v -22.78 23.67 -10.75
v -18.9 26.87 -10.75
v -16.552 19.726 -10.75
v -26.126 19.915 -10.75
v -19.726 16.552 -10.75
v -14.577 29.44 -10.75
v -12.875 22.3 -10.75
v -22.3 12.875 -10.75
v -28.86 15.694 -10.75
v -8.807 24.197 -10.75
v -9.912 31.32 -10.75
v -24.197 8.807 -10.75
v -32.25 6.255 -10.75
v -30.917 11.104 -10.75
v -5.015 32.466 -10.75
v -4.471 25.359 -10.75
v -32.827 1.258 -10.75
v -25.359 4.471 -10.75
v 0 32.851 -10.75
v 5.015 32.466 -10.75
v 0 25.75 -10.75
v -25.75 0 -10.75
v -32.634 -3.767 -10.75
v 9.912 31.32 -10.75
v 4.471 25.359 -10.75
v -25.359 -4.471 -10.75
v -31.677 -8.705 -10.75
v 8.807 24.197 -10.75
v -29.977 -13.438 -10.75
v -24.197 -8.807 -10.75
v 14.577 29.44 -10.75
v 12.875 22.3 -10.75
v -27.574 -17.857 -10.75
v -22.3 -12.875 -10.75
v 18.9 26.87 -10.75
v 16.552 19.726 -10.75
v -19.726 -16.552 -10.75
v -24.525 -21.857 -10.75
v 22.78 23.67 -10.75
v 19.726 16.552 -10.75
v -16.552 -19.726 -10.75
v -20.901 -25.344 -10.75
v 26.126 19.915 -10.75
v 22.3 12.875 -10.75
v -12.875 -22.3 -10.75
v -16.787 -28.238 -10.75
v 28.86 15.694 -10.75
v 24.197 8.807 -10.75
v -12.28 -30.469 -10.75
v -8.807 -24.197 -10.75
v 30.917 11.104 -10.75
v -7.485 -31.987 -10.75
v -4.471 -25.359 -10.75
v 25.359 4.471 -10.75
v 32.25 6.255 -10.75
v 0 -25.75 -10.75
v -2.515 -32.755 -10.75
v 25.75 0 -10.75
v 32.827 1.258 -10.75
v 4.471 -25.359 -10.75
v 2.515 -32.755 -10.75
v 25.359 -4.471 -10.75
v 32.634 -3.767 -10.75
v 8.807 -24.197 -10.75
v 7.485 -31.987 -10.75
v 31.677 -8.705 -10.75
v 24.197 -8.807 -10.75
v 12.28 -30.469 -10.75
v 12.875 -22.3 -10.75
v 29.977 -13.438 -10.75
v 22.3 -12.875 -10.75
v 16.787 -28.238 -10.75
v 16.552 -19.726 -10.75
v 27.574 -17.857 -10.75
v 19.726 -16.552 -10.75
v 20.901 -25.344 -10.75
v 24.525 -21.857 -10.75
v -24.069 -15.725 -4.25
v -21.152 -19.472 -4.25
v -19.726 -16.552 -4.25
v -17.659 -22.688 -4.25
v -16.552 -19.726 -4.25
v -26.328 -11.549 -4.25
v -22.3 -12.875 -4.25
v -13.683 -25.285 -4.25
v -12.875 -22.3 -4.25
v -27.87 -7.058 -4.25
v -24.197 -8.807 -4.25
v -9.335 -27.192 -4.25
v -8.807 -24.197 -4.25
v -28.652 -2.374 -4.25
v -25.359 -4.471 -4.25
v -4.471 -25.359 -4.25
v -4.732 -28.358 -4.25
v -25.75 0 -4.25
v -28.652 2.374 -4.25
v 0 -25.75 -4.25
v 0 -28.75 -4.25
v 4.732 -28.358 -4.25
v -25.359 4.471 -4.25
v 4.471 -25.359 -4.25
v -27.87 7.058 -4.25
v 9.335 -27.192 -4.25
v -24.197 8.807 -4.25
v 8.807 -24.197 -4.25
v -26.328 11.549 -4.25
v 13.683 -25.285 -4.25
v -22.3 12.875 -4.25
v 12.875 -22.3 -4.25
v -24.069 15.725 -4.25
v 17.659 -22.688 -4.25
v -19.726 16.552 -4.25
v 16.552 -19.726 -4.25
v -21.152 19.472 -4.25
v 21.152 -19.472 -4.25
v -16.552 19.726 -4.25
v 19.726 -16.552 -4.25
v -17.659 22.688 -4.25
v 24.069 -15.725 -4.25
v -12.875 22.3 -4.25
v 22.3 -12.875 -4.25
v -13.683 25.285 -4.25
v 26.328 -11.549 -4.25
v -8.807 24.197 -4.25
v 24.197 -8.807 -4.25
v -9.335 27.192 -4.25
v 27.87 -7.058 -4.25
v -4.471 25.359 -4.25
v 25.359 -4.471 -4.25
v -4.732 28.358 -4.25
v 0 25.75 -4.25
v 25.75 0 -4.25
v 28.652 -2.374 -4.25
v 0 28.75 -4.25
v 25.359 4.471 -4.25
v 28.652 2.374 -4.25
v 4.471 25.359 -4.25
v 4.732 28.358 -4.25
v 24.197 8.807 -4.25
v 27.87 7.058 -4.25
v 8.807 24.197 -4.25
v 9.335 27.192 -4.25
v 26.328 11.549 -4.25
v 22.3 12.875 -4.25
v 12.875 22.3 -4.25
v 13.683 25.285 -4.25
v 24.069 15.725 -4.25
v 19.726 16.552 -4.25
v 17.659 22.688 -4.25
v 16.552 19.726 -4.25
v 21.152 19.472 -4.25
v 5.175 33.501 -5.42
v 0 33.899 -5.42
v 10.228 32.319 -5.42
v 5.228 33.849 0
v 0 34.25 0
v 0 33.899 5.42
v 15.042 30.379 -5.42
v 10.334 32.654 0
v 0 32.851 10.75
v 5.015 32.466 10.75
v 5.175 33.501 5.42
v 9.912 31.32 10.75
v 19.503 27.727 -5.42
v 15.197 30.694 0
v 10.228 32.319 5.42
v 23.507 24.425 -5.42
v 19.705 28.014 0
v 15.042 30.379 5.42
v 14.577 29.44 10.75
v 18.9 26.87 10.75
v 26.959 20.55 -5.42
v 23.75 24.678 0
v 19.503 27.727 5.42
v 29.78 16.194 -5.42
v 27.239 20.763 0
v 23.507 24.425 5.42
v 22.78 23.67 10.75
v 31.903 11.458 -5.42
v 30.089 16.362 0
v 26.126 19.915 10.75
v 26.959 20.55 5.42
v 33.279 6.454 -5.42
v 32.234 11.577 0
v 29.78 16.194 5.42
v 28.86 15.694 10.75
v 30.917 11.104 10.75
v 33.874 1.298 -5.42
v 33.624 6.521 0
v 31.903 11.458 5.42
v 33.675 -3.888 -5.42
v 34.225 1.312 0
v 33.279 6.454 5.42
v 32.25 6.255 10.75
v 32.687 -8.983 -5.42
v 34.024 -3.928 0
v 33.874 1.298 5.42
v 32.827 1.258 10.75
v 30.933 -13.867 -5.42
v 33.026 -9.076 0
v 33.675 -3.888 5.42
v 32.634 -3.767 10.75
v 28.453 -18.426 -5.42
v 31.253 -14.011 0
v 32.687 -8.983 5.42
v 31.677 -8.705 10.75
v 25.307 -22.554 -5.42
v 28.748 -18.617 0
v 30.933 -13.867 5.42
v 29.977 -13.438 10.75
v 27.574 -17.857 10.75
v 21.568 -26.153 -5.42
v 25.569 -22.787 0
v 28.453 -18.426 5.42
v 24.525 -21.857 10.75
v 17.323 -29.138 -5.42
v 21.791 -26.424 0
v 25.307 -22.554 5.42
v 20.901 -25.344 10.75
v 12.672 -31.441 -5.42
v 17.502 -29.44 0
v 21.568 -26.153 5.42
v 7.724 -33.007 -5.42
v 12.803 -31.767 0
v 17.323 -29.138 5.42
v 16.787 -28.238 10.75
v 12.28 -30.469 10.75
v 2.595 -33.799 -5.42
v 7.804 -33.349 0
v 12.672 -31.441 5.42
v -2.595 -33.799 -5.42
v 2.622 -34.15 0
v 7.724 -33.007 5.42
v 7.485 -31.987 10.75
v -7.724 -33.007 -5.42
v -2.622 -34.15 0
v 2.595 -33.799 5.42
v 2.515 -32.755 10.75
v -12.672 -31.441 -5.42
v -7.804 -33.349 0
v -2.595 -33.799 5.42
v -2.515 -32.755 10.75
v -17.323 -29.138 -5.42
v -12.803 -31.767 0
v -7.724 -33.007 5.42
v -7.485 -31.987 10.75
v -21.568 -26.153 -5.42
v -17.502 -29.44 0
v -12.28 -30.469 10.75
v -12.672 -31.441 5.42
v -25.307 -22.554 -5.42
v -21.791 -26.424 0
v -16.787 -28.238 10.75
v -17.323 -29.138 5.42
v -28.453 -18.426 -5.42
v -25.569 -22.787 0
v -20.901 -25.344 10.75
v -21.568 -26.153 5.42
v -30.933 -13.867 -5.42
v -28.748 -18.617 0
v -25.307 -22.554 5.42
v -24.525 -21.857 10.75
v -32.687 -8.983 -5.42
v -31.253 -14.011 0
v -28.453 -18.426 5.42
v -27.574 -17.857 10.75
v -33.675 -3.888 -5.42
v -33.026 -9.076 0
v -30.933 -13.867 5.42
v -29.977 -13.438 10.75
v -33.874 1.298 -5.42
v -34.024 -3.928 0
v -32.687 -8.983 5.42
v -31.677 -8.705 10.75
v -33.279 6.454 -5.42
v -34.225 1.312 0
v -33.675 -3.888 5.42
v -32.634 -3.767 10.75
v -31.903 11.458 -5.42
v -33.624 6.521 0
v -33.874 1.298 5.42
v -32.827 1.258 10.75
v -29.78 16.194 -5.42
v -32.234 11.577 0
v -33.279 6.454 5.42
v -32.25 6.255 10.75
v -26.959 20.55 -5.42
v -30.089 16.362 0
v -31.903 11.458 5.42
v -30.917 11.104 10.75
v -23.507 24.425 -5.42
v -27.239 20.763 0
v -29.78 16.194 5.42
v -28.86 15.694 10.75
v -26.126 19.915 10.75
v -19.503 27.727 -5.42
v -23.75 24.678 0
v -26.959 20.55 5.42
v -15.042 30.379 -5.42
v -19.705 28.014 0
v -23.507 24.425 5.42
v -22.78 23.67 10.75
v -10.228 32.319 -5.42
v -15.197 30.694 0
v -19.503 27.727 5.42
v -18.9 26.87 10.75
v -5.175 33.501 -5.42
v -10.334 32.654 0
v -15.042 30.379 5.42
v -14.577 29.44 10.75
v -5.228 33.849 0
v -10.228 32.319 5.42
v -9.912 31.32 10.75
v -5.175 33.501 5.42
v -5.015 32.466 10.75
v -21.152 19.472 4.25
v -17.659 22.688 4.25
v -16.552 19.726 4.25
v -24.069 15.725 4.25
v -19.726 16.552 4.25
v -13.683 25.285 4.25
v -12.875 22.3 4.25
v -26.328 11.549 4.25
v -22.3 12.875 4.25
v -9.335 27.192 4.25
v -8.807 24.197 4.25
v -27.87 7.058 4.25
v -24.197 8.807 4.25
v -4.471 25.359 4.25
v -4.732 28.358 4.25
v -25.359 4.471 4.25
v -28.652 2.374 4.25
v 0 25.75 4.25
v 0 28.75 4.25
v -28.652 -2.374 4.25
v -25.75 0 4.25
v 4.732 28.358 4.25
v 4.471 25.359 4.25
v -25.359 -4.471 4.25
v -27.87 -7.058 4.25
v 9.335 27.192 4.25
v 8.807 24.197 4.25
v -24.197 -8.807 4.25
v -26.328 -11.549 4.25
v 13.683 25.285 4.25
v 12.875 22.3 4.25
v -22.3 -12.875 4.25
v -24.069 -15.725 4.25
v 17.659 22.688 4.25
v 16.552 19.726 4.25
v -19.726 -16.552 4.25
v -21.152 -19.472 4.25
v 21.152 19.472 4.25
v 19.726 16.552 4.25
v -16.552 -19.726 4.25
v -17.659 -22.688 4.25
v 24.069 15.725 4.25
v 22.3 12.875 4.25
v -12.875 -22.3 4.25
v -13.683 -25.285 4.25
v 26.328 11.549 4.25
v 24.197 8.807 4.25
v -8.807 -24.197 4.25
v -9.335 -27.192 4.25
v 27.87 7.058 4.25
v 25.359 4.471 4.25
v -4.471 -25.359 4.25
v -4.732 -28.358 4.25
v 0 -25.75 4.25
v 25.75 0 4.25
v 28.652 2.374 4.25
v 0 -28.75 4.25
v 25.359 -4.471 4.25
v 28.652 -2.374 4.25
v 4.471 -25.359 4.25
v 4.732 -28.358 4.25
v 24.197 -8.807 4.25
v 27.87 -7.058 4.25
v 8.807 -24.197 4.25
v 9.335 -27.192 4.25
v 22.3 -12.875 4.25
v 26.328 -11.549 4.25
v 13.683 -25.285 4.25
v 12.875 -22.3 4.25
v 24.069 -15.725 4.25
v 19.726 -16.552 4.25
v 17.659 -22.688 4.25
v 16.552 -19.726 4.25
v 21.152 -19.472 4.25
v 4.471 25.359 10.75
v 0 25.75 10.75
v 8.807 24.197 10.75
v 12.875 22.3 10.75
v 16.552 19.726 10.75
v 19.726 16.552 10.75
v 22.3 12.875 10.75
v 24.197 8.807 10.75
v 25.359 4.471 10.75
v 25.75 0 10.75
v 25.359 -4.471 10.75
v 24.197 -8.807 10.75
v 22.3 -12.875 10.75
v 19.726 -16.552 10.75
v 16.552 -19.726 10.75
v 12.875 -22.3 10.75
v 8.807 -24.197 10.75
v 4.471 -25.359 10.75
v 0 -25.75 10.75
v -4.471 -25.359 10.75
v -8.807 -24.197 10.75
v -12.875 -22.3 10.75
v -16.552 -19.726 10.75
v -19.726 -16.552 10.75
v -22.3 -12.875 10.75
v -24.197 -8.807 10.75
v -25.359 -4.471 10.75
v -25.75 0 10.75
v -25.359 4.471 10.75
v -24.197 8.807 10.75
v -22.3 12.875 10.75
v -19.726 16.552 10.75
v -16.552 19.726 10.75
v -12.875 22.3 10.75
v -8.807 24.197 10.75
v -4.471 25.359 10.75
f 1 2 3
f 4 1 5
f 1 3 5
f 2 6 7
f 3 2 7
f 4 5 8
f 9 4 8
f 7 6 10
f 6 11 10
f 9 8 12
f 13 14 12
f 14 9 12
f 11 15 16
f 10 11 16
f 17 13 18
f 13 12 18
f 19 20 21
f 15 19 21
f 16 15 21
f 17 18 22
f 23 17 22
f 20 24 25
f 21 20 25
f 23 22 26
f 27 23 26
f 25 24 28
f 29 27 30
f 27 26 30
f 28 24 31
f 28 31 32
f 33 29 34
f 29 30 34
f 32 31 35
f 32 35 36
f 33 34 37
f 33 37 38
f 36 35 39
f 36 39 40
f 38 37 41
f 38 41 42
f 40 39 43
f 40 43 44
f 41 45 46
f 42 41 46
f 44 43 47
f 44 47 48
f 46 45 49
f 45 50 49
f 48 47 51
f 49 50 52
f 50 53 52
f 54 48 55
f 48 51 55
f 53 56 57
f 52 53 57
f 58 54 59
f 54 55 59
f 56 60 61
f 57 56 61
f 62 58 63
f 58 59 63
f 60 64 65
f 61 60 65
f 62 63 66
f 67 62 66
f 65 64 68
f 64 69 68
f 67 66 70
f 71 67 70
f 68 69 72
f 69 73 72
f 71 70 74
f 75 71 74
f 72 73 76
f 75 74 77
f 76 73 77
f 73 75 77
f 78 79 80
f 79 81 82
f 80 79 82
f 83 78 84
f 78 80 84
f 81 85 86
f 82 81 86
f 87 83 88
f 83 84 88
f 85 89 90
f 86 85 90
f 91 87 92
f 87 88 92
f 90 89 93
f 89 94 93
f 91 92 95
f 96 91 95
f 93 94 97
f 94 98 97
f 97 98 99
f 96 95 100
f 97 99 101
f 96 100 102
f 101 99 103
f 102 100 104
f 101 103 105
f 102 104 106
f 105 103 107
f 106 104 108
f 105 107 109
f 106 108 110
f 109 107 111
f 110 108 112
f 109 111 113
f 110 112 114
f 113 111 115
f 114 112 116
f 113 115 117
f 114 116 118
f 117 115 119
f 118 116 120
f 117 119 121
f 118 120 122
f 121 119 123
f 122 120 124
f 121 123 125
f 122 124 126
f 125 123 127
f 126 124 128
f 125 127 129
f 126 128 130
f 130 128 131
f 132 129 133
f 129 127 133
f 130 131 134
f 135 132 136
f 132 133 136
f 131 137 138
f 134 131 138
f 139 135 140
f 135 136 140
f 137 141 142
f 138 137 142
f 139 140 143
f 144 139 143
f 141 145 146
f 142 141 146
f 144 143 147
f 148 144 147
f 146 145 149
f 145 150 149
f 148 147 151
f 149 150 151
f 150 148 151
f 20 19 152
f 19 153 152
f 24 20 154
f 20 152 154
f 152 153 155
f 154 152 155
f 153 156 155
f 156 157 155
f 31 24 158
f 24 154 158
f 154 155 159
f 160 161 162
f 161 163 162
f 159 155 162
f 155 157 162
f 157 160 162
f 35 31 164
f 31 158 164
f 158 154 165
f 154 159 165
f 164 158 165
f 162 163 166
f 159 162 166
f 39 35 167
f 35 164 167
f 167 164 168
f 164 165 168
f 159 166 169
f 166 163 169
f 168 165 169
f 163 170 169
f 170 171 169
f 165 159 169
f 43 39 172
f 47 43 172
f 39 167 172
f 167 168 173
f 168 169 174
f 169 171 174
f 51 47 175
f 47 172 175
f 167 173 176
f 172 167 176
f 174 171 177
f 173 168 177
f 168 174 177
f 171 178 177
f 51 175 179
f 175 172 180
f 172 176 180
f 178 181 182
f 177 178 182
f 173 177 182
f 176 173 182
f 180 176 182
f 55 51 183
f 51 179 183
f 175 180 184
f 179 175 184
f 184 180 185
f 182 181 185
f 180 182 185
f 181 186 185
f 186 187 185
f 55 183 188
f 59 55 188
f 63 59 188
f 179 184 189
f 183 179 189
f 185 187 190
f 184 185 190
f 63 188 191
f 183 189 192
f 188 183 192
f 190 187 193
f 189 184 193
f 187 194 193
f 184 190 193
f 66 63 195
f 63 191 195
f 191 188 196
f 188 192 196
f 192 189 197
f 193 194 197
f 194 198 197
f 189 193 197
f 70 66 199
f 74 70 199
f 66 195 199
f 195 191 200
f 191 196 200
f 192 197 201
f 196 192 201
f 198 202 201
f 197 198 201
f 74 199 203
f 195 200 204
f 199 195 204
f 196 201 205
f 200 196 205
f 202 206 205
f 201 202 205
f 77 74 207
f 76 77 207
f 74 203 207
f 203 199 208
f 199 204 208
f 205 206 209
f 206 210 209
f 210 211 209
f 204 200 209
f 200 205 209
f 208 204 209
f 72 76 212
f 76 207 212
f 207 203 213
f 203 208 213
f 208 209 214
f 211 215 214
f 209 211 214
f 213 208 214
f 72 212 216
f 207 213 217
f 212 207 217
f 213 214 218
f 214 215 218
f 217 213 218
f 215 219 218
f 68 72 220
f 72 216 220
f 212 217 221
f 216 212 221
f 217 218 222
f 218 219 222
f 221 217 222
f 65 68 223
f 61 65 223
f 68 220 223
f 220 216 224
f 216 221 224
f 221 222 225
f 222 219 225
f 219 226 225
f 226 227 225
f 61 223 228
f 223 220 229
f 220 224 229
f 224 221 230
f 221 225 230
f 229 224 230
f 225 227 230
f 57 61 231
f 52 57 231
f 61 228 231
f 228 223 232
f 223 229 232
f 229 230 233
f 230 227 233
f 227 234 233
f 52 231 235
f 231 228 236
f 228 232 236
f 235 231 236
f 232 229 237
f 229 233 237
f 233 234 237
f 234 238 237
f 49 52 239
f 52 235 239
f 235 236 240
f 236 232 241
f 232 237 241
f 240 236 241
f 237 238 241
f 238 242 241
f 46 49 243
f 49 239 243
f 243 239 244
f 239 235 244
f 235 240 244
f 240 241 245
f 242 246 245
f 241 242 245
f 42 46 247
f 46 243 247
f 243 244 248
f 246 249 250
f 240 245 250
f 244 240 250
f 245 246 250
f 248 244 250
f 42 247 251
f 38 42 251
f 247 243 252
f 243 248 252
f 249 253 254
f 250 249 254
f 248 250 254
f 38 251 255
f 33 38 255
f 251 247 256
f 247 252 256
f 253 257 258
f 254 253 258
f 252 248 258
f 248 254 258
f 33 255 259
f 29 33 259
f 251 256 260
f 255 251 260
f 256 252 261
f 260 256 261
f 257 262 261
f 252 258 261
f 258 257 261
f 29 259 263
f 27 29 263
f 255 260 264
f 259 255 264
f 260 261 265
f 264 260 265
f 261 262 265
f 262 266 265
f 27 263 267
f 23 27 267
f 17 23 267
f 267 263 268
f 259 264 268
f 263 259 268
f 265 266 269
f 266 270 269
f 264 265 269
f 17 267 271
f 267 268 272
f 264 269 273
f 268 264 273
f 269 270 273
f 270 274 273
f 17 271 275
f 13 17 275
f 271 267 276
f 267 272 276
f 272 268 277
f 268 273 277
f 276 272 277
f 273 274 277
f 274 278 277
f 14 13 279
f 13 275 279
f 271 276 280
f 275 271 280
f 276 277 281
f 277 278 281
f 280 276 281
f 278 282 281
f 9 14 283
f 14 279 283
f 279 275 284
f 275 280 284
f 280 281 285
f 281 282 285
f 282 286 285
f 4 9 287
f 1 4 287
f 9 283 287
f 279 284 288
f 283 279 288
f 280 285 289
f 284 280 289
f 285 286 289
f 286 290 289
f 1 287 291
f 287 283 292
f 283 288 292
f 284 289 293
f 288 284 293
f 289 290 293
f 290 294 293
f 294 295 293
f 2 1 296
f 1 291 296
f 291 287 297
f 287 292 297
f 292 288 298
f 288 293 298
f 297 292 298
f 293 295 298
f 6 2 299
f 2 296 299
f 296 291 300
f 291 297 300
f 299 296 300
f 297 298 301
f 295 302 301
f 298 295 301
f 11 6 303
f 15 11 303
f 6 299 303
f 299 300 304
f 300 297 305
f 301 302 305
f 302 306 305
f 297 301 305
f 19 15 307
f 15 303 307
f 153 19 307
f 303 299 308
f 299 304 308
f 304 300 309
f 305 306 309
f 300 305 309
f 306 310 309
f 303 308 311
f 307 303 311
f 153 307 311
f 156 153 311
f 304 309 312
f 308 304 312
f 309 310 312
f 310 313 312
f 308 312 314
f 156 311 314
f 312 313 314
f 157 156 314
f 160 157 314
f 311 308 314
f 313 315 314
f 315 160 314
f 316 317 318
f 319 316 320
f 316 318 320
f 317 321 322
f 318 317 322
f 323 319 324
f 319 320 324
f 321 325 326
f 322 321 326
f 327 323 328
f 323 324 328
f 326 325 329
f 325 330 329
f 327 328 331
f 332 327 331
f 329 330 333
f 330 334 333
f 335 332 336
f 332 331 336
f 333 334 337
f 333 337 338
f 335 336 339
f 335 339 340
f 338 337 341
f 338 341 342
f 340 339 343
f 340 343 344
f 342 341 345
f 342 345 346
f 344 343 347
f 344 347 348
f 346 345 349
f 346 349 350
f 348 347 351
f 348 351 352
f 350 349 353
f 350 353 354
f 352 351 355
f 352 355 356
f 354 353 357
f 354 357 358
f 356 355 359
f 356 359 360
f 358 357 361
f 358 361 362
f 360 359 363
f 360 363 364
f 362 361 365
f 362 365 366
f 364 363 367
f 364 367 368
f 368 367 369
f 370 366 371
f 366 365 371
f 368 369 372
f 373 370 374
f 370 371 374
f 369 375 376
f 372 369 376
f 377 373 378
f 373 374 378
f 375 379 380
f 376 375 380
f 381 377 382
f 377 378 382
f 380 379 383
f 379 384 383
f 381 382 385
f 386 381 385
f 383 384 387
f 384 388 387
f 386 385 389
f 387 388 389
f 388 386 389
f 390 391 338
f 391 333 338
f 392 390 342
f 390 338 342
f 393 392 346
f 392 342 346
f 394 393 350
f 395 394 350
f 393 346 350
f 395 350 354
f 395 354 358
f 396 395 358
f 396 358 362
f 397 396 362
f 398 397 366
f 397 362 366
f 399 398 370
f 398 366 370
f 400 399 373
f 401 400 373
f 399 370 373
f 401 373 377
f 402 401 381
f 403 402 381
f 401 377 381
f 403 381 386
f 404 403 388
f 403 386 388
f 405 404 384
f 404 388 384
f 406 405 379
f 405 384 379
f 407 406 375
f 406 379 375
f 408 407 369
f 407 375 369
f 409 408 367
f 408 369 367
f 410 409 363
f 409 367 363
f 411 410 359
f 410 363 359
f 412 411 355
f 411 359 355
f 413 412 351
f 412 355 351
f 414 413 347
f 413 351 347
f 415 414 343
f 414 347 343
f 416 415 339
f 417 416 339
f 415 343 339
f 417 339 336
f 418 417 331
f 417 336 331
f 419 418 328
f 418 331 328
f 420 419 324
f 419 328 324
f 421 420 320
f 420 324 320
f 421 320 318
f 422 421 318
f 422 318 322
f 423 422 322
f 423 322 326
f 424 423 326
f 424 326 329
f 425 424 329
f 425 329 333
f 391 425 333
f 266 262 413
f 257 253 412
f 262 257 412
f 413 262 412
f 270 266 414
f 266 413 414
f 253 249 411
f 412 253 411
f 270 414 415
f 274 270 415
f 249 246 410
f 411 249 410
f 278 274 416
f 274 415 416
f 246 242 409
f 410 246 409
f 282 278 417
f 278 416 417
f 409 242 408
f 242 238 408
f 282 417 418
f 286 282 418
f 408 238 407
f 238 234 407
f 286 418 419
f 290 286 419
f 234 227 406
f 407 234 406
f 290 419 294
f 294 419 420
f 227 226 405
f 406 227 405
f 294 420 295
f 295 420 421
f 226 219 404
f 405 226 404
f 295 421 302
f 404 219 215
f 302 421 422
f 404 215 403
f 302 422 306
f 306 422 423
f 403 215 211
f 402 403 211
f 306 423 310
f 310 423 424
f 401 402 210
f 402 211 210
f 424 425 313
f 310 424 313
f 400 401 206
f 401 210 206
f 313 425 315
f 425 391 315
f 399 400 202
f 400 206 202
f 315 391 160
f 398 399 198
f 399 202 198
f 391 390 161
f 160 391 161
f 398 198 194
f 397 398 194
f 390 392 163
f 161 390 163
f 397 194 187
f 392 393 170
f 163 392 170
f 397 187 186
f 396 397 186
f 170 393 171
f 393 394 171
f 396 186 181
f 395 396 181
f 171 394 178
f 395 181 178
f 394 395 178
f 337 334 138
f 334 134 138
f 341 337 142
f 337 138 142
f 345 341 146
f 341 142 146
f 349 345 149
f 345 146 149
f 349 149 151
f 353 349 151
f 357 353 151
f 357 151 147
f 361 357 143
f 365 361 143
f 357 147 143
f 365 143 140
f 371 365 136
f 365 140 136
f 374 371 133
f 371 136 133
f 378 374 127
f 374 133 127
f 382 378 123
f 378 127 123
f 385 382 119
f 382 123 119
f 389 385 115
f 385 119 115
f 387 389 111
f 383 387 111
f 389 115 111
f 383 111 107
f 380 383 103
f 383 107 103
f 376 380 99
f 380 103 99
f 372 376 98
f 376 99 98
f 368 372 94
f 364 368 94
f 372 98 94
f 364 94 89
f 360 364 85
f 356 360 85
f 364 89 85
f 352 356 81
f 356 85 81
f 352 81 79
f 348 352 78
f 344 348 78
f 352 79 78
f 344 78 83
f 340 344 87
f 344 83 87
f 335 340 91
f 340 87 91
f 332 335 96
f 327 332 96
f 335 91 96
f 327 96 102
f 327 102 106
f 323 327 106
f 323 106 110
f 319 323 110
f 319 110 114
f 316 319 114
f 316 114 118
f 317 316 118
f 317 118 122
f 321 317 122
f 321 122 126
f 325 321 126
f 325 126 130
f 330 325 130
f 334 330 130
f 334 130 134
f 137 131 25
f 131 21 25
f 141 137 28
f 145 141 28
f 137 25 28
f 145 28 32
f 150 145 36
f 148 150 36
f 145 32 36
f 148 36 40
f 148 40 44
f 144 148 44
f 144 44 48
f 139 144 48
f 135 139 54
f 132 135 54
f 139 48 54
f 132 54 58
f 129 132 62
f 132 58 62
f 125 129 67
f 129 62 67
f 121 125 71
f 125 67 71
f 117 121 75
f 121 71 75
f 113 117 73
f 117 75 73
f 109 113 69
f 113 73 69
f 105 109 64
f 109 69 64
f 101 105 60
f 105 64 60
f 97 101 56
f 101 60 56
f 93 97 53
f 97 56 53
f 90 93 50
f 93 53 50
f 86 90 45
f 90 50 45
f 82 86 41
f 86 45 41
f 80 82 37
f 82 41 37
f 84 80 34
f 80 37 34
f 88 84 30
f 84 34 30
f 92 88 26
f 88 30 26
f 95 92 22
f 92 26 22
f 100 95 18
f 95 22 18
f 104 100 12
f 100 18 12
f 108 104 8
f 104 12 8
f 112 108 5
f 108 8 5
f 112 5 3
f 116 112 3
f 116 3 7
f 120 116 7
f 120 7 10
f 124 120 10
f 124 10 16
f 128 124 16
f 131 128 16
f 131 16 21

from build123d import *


with BuildPart() as part:
    # Sketch1 → Revolve1 (revolve)
    with BuildSketch(Plane(origin=(0, 0, 0), x_dir=(0, 0, -1), z_dir=(1, 0, 0))):
        with BuildLine():
            Line((-10.75, 25.75), (-4.25, 25.75))
            Line((-4.25, 25.75), (-4.25, 28.75))
            Line((-4.25, 28.75), (4.25, 28.75))
            Line((4.25, 28.75), (4.25, 25.75))
            Line((4.25, 25.75), (10.75, 25.75))
            Line((10.75, 25.75), (10.75, 32.850954422))
            ThreePointArc((10.75, 32.850954422), (0, 34.25), (-10.75, 32.850954422))
            Line((-10.75, 32.850954422), (-10.75, 25.75))
        make_face()
    revolve(axis=Axis((0, 0, 733.316005498), (0, 0, -1)))


solid = part.part
